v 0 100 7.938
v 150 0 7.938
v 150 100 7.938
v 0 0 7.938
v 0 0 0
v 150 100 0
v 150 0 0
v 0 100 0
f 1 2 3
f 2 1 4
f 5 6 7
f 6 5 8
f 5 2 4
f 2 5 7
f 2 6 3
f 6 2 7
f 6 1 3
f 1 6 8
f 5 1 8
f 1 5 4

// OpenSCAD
$fn = 64;

inch = 25.4;
thickness = 5/16 * inch;   // ~5/16"
width = 100;               // mm
length = 150;              // mm

cube([length, width, thickness], center=false);
